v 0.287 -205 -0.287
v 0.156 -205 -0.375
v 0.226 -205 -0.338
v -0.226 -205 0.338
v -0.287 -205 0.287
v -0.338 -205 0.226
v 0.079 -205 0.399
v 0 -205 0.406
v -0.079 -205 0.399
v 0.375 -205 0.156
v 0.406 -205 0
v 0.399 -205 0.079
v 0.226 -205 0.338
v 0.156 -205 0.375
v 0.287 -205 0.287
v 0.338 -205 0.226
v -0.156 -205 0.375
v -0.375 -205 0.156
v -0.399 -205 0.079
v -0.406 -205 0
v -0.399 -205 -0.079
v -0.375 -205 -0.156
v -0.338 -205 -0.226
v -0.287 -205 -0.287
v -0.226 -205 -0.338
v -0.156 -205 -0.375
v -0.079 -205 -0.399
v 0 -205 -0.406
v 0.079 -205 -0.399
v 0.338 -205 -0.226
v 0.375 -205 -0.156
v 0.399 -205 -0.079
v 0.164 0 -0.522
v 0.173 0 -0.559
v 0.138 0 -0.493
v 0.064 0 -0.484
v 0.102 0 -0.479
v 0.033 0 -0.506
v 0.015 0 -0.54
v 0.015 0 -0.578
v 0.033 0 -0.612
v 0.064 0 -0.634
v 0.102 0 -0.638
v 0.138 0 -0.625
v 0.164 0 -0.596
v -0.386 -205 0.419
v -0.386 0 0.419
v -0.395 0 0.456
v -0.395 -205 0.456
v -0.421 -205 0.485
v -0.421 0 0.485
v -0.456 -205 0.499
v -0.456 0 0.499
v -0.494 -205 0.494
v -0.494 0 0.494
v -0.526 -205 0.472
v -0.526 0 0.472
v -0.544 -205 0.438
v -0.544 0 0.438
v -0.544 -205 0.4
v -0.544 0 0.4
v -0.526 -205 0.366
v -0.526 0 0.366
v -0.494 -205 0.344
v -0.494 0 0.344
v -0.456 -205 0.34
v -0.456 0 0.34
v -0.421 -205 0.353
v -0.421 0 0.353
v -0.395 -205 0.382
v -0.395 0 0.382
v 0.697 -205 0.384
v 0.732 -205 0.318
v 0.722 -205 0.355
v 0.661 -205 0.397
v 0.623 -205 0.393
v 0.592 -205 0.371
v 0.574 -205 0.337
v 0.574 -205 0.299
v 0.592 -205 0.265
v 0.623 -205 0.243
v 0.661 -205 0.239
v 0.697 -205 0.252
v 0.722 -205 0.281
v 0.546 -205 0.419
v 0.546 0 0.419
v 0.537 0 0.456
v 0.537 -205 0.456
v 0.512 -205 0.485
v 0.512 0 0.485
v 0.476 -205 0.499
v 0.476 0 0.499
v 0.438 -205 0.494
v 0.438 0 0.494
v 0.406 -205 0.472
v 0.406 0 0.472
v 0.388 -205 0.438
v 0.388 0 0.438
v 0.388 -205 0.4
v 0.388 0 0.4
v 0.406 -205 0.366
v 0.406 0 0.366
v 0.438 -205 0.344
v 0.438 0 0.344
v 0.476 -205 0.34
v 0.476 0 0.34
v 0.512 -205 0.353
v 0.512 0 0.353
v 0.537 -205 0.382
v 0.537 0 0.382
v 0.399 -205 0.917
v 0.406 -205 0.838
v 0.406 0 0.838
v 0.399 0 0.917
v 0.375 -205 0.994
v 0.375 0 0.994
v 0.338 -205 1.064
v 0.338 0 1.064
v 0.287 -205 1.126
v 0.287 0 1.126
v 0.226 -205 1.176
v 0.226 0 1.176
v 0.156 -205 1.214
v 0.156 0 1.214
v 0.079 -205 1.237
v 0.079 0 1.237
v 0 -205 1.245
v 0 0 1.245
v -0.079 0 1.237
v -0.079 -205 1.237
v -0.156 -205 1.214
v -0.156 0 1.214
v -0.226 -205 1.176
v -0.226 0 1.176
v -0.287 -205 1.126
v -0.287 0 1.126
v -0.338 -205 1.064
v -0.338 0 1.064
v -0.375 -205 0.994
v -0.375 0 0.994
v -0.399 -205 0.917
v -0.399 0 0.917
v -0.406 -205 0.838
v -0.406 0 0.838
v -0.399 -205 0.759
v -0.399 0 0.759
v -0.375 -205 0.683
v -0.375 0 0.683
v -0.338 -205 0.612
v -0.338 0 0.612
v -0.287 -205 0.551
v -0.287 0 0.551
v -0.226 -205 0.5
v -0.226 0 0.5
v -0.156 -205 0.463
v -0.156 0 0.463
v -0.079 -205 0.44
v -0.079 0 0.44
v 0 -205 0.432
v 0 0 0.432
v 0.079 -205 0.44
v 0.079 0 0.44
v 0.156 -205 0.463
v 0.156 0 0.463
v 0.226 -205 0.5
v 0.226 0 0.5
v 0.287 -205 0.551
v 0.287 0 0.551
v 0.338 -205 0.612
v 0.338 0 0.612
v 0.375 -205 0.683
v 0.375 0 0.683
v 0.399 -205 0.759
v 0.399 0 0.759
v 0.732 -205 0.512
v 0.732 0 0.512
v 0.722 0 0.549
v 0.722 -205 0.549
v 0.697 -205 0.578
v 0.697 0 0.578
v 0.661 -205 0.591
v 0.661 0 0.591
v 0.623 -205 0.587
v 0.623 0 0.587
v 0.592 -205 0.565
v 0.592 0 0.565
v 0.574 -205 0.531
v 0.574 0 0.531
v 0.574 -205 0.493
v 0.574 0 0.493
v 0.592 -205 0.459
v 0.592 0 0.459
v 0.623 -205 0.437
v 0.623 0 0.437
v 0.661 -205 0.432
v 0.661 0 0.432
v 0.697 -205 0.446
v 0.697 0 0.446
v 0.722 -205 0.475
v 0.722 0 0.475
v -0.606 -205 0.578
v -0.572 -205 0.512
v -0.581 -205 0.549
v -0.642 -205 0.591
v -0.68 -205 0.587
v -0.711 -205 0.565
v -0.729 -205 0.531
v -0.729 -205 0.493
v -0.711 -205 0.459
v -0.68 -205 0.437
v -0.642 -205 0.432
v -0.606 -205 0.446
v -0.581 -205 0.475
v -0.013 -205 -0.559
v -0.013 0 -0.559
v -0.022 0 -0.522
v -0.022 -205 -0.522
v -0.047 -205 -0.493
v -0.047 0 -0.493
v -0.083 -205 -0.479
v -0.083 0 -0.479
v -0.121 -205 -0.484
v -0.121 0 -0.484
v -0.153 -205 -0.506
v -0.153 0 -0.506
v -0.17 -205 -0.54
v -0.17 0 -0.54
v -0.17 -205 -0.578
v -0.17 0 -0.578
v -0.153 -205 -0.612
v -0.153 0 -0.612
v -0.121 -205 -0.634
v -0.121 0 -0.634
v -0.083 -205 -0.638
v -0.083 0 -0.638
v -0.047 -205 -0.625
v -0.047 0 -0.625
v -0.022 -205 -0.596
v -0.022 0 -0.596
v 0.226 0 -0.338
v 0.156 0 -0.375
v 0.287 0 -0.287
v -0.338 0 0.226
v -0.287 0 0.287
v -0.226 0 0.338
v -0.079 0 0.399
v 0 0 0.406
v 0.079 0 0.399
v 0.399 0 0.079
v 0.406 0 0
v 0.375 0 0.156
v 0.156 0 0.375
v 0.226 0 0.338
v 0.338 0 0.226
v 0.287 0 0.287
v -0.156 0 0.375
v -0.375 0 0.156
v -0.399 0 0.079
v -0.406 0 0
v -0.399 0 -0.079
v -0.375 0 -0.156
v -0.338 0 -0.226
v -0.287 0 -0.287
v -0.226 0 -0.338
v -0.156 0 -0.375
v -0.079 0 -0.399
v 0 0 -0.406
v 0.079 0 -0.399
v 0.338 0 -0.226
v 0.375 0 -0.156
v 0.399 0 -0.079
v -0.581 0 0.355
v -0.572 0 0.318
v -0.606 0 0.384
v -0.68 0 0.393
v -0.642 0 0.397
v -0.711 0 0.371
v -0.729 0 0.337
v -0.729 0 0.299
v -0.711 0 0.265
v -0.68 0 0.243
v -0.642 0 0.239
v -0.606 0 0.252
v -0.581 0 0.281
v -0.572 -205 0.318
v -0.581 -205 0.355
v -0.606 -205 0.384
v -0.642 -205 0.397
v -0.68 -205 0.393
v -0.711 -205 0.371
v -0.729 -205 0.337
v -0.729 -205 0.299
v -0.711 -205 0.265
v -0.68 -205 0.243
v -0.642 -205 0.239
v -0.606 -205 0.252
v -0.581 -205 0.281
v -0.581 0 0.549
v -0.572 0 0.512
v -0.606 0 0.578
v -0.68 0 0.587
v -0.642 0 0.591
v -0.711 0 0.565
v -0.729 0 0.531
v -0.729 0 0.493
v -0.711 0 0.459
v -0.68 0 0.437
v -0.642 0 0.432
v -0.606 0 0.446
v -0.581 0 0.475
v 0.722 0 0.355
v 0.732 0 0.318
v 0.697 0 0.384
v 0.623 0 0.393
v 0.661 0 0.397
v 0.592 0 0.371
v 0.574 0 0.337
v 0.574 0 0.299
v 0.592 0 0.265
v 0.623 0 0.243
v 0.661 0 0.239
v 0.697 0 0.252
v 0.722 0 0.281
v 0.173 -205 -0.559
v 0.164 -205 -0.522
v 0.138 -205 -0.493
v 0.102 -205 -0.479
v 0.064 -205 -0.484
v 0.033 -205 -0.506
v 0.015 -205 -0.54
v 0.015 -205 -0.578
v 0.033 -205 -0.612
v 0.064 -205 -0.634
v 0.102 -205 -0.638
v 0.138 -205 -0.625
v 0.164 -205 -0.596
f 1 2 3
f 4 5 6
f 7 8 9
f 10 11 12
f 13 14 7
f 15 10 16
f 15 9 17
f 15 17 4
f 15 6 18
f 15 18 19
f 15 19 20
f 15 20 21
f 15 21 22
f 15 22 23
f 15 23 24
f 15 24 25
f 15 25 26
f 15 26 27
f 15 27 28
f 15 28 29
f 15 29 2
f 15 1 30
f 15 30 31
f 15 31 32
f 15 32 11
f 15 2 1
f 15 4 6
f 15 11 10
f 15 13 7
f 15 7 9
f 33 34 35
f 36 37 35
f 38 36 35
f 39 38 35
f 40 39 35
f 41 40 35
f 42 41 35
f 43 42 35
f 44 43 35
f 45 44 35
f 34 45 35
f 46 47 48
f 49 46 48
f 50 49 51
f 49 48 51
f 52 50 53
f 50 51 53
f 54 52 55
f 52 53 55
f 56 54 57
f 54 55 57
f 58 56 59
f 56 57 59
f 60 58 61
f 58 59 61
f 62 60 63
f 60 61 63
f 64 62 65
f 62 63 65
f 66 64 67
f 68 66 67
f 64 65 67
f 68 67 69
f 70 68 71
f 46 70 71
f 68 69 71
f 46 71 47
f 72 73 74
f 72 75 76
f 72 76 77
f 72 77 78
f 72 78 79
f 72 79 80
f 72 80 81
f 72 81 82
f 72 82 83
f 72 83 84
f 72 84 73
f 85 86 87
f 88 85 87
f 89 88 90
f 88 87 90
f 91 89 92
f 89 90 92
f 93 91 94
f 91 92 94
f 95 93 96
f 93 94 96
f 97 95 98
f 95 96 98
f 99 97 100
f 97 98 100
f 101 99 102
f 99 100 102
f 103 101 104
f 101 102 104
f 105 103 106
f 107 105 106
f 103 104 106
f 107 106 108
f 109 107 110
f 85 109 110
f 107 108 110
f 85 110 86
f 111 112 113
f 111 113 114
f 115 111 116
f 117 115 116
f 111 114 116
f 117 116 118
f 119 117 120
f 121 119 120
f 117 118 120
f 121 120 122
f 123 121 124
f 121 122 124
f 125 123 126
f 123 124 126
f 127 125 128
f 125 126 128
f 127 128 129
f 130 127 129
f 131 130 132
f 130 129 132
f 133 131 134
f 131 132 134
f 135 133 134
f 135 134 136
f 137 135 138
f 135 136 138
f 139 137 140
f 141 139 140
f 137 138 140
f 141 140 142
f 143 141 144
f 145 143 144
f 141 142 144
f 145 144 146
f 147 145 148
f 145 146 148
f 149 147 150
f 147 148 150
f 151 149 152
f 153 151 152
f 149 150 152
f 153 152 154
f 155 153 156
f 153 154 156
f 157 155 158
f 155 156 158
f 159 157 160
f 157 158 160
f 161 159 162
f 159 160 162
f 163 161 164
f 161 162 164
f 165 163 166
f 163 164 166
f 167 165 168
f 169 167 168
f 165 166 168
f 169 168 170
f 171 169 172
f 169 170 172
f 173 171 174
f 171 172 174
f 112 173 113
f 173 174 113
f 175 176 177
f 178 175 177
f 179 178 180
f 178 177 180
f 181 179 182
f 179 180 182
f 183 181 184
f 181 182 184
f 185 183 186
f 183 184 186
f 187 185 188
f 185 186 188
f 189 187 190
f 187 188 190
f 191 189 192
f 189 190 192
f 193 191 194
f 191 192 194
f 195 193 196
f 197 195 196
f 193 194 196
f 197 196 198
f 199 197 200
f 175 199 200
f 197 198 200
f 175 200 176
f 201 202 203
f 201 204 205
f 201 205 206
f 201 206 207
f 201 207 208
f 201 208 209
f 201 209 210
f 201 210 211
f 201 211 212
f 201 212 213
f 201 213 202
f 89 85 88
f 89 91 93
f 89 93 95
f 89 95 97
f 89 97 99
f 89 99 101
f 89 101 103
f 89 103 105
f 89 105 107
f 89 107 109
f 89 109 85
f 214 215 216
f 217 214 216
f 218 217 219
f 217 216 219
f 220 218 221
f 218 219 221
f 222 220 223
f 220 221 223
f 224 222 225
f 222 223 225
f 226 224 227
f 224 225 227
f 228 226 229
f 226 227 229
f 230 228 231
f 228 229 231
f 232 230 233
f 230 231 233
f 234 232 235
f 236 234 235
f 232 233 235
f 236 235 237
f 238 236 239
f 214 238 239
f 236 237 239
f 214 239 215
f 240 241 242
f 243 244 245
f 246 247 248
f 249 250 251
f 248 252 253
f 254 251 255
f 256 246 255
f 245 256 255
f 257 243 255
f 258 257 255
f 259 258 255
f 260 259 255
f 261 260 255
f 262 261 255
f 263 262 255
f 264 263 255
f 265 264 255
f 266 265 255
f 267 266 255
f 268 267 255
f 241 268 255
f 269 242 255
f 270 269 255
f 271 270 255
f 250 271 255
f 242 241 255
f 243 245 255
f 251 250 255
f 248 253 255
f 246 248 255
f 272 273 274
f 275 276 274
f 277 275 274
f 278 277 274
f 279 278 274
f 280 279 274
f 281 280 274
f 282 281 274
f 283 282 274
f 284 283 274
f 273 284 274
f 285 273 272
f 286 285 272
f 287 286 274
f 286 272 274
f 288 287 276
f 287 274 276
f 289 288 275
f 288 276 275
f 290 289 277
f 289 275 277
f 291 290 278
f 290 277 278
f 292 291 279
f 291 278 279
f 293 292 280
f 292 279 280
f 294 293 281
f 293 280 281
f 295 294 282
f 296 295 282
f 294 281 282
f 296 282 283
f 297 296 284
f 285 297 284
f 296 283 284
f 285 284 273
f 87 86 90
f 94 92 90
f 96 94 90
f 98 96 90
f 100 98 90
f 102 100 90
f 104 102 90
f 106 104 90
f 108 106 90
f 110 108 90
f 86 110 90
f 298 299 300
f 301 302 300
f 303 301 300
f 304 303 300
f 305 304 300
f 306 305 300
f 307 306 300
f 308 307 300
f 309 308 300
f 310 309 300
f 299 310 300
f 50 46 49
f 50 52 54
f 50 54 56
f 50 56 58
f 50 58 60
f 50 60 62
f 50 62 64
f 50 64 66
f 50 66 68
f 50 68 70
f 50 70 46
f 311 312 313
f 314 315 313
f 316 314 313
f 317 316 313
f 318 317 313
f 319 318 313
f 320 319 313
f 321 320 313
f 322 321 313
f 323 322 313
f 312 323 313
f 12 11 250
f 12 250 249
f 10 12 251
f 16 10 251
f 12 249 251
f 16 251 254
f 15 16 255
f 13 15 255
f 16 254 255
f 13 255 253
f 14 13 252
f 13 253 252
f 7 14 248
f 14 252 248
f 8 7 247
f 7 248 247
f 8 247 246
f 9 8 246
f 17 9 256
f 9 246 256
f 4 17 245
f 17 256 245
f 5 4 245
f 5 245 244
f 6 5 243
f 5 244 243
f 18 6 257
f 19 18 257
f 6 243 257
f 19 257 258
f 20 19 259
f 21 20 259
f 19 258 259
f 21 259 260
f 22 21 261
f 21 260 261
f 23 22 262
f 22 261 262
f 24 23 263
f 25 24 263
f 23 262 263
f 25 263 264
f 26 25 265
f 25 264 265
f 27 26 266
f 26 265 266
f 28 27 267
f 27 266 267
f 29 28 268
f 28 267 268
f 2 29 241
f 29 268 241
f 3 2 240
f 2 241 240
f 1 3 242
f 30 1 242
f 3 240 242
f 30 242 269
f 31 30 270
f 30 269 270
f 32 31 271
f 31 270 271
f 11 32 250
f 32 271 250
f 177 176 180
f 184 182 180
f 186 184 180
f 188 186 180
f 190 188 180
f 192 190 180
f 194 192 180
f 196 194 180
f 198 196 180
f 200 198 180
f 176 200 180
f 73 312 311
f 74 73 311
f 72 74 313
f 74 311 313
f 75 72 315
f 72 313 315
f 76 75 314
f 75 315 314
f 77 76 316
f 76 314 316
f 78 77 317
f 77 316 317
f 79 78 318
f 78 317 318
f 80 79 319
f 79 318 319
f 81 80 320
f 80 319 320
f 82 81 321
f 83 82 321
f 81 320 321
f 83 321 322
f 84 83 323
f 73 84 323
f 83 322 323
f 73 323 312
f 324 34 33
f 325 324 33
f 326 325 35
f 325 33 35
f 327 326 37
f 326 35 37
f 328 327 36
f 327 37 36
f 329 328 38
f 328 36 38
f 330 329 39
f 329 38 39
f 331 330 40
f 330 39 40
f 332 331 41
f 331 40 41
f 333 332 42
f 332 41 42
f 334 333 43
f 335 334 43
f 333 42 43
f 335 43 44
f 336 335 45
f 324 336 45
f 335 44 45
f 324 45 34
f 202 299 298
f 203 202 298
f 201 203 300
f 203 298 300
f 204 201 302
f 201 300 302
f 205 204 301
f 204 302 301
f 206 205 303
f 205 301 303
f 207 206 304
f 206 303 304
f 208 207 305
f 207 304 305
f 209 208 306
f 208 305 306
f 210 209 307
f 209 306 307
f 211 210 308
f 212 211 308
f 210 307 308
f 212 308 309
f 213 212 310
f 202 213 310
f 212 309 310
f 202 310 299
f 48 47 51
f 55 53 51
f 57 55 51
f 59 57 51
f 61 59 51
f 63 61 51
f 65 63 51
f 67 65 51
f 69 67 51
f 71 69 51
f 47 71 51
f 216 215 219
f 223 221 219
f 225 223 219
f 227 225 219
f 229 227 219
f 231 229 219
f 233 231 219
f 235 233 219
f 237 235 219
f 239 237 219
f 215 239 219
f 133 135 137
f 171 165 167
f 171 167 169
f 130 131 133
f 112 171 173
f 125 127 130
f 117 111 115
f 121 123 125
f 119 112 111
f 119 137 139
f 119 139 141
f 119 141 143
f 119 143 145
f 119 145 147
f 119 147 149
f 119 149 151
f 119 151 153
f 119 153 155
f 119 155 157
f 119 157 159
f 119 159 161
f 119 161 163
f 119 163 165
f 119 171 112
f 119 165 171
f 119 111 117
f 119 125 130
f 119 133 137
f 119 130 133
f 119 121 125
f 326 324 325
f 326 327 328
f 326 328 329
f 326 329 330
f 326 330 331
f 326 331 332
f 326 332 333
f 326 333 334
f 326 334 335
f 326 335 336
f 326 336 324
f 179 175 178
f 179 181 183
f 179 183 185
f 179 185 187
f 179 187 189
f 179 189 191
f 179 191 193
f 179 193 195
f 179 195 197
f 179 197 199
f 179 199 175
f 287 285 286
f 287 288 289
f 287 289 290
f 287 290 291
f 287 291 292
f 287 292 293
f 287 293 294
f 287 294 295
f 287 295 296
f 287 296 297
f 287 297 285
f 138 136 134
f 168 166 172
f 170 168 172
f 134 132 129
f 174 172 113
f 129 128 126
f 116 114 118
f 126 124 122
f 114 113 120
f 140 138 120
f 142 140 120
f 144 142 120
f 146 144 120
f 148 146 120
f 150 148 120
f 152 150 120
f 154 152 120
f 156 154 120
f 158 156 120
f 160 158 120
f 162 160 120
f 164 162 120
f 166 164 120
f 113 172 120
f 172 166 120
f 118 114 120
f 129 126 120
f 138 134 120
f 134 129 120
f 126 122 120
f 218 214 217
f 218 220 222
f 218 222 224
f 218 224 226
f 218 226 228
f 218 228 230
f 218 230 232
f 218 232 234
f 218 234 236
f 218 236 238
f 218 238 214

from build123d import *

# Parameters (mm, degrees)
F0_R     = 0.4064
F0_R_2   = 0.08001
F1_DEPTH = 205


with BuildPart() as f1:
    # F0 (on Front) → F1 (new body)
    with BuildSketch(Plane.XZ):
        with Locations((0, 0.8382)):
            Circle(F0_R)
        Circle(F0_R)
        with Locations((-0.46609, 0.4191)):
            Circle(F0_R_2)
        with Locations((-0.65151, 0.51181)):
            Circle(F0_R_2)
        with Locations((-0.65151, 0.318008)):
            Circle(F0_R_2)
        with Locations((0.46609, 0.4191)):
            Circle(F0_R_2)
        with Locations((0.65151, 0.51181)):
            Circle(F0_R_2)
        with Locations((0.65151, 0.318008)):
            Circle(F0_R_2)
        with Locations((0.09271, -0.5588)):
            Circle(F0_R_2)
        with Locations((-0.09271, -0.5588)):
            Circle(F0_R_2)
    extrude(amount=F1_DEPTH)


solid = f1.part
